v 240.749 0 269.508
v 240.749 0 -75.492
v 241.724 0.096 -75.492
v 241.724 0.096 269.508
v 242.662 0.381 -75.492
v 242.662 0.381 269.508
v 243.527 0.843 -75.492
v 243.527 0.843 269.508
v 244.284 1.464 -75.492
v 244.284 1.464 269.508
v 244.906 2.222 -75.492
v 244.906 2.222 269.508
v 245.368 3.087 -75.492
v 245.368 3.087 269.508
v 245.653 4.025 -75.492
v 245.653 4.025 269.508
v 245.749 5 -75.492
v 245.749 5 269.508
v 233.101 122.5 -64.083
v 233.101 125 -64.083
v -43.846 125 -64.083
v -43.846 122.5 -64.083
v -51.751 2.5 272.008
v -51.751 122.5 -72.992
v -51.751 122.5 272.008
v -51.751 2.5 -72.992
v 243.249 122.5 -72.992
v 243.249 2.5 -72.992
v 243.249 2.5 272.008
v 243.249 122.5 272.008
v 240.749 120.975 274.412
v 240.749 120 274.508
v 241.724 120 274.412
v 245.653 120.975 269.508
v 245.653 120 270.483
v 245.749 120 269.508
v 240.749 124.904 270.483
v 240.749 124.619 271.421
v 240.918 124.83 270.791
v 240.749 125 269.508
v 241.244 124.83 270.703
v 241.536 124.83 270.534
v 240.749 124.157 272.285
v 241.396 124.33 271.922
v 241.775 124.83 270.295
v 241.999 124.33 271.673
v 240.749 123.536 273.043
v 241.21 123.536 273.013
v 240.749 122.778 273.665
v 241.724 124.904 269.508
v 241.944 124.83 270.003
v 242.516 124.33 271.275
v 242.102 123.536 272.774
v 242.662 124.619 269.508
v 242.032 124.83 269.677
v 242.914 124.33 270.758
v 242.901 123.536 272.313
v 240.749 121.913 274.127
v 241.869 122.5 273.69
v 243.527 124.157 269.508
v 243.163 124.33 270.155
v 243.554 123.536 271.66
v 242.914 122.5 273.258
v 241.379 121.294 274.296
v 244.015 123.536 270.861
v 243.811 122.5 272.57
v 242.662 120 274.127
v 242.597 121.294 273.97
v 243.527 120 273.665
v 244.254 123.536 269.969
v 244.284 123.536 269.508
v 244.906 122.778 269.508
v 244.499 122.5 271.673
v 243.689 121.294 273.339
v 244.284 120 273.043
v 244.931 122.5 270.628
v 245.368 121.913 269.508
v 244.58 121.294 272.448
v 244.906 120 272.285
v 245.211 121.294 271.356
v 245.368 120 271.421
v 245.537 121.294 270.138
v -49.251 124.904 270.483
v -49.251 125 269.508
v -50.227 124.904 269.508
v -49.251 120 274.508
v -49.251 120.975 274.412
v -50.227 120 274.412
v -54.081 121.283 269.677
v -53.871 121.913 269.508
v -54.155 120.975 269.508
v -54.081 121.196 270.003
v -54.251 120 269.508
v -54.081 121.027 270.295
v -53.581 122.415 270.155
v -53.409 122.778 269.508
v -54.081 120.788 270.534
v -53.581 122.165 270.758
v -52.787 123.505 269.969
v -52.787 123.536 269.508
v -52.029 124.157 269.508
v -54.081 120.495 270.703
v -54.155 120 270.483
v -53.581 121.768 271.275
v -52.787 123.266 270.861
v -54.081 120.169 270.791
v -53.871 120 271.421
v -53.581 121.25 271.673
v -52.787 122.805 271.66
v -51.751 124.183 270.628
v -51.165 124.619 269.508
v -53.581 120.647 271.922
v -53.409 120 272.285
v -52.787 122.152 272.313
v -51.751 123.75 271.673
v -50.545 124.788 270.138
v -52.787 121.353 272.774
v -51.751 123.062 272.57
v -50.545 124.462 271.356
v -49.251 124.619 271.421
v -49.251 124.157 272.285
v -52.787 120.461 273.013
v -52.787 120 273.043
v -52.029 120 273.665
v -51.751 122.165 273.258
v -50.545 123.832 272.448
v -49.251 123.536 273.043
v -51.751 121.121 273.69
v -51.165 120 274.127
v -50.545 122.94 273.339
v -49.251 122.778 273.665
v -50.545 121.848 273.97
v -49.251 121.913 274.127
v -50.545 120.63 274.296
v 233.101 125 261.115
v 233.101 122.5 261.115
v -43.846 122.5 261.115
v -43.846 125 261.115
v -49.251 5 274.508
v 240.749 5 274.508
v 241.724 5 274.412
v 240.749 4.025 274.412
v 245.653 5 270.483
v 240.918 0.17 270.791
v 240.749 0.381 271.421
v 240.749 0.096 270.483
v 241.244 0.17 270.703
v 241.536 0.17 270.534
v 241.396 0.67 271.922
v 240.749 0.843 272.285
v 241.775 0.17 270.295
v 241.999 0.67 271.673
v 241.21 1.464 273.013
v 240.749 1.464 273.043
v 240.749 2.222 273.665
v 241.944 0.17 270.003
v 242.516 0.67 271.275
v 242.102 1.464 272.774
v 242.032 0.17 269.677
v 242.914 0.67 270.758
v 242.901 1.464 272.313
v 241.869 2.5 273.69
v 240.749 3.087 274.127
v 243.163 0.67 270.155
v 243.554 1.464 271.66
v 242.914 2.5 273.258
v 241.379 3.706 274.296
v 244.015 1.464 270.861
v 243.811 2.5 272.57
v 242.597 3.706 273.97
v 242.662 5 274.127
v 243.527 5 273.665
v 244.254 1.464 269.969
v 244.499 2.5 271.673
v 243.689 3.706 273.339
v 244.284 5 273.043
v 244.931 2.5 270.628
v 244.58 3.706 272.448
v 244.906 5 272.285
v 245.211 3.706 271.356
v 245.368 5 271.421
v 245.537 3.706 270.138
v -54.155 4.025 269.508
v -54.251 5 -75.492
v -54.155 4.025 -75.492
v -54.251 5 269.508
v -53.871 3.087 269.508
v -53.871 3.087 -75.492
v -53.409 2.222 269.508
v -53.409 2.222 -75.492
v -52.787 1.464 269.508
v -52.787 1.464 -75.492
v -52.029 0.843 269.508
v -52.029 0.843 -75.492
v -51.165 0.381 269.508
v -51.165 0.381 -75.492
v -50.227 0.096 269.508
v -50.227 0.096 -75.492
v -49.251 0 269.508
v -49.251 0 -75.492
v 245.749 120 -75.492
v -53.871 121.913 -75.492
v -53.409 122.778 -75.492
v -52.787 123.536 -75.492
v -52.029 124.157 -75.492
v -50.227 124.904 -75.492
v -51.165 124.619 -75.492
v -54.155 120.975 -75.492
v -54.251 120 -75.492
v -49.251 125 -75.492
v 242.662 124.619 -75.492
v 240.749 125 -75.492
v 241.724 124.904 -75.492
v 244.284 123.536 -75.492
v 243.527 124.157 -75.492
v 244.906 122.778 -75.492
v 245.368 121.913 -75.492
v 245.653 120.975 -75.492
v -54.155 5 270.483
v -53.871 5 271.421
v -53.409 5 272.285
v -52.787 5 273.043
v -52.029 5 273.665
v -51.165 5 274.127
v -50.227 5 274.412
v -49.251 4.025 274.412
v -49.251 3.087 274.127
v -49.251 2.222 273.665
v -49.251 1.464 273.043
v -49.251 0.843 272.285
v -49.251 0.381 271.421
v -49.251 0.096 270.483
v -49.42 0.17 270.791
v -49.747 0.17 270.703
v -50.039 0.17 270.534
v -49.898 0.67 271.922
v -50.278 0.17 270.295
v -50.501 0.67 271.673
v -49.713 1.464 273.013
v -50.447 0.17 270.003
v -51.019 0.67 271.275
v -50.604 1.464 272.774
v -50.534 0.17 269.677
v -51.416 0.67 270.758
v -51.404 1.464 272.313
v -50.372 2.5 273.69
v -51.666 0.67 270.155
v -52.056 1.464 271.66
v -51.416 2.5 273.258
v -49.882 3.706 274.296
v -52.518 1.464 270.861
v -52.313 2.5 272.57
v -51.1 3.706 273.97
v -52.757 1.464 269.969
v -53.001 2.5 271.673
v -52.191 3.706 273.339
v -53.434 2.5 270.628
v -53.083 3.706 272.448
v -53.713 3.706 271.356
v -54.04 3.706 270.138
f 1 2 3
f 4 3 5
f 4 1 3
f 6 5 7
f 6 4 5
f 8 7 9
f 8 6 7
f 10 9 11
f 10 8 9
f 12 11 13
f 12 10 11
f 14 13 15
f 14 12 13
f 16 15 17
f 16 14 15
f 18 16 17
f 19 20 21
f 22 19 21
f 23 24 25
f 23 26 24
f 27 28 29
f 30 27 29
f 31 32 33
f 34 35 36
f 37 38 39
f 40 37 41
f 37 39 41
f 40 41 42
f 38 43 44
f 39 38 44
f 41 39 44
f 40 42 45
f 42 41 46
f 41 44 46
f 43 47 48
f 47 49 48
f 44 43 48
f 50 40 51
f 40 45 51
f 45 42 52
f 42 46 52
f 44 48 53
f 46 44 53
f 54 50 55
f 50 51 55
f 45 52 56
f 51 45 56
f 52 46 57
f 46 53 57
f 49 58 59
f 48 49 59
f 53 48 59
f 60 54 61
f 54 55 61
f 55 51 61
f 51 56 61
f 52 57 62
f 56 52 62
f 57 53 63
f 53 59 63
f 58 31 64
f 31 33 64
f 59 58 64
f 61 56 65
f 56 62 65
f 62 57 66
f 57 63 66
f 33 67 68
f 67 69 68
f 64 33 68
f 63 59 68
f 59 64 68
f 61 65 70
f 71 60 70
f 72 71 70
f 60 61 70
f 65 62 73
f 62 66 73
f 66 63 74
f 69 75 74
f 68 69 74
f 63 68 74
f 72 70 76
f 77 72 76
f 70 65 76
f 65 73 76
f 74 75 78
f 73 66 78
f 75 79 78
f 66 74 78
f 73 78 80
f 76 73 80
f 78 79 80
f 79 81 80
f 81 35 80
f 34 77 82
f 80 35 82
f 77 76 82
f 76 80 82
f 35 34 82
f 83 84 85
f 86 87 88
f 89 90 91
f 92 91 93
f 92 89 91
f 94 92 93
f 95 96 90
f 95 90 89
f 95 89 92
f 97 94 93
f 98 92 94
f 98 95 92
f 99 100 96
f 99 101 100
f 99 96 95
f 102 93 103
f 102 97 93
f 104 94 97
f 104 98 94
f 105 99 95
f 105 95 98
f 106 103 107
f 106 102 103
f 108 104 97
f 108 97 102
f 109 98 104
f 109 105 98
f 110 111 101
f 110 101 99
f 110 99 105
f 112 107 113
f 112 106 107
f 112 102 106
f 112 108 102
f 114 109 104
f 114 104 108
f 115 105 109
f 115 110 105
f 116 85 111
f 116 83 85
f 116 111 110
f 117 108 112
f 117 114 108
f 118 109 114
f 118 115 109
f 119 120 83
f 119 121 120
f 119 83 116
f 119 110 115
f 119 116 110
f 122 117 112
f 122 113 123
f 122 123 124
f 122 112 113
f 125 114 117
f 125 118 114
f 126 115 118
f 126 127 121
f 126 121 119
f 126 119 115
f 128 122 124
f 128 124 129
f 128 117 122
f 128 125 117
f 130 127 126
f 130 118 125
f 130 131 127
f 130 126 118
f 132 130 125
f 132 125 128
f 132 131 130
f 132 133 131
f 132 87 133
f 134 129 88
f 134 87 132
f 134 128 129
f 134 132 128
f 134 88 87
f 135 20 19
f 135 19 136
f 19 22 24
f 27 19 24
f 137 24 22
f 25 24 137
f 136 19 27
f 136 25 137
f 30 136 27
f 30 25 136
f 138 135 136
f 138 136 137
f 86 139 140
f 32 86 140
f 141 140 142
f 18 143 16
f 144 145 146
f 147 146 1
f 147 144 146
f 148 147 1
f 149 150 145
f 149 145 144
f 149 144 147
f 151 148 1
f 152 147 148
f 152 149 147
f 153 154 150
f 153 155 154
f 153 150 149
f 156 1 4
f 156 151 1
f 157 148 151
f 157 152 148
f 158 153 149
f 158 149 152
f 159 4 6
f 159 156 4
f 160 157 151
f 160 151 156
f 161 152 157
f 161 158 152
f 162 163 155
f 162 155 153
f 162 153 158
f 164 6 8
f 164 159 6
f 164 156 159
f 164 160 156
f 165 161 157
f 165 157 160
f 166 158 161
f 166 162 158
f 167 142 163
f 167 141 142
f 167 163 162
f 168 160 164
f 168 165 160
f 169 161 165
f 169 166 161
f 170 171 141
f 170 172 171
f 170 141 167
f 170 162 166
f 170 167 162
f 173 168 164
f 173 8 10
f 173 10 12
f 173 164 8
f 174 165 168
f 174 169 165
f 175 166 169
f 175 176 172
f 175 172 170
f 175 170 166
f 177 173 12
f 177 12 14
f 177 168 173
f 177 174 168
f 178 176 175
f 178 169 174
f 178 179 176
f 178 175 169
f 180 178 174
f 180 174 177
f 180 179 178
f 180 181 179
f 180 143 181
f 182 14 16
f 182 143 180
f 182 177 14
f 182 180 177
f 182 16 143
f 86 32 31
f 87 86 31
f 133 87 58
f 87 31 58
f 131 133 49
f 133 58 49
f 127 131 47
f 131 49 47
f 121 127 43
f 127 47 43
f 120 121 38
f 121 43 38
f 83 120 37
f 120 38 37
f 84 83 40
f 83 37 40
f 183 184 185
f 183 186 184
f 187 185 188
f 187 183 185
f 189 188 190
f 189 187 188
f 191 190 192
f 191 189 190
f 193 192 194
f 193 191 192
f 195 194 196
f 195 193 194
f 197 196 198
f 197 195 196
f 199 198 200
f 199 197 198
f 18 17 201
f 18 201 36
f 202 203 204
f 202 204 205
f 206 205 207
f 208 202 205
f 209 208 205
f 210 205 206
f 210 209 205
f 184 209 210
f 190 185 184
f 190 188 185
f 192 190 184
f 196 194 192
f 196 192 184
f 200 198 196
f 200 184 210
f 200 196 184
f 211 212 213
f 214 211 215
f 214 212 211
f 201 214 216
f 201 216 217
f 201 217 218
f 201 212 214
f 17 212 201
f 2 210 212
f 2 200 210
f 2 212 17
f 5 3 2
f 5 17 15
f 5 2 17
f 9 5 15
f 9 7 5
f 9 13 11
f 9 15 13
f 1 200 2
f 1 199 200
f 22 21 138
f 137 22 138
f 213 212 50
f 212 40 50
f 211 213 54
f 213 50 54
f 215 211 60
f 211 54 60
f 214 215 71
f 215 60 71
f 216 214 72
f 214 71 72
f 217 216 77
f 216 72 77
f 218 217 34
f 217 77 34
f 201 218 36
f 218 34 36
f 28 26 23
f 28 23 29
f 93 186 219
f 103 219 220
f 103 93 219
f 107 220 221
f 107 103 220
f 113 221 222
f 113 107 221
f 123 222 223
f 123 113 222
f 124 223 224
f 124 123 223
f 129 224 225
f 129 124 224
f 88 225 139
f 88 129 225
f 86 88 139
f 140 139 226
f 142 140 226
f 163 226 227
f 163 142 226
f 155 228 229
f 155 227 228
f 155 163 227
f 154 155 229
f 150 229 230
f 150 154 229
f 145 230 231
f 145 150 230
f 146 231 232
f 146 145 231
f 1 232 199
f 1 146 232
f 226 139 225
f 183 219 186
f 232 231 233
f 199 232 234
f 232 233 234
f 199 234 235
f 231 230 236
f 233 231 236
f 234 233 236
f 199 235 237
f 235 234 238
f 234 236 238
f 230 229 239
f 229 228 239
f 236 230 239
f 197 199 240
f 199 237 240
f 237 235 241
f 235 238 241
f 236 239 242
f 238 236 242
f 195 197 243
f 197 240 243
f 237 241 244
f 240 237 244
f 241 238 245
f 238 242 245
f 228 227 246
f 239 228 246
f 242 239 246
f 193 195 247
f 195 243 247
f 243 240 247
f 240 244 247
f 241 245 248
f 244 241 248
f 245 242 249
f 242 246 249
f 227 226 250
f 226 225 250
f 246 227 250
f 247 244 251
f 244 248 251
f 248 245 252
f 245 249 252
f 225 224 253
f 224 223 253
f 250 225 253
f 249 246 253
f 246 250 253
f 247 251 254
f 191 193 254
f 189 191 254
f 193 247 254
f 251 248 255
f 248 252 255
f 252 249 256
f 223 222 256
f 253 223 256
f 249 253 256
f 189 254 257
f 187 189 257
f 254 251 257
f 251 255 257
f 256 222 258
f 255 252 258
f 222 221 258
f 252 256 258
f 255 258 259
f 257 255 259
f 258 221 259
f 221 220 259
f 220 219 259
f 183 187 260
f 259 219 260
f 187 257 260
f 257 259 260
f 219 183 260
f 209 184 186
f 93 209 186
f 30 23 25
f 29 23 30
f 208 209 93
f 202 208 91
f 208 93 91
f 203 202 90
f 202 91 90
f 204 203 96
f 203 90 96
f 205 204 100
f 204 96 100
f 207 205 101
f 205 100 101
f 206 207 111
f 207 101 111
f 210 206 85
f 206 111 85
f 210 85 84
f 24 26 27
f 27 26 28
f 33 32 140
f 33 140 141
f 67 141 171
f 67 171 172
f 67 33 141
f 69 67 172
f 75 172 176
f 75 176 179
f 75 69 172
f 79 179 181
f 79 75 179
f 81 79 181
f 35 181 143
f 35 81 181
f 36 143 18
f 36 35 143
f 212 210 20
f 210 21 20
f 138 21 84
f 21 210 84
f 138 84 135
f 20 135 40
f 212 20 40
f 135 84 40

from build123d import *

# Parameters (mm, degrees)
F0_W     = 300
F0_H     = 350
F1_DEPTH = 125
F2_T     = -2.5
F3_R     = 5
F4_W     = 276.946939528
F4_H     = 325.1978382468
F5_DEPTH = 120


with BuildPart() as f1:
    # F0 (on Front) → F1 (new body)
    with BuildSketch(Plane.XZ):
        with Locations((95.7486510277, 99.5076403022)):
            Rectangle(F0_W, F0_H)
    extrude(amount=-F1_DEPTH)

    # F2 (hollow: no face is removed)
    offset(amount=F2_T, mode=Mode.SUBTRACT)

    # F3
    f3_edges = [f1.edges().sort_by_distance(p)[0] for p in [
        (245.748651, 62.5, 274.50764),
        (95.748651, 125, 274.50764),
        (245.748651, 125, 99.50764),
        (-54.251349, 125, 99.50764),
        (-54.251349, 62.5, 274.50764),
        (95.748651, 0, 274.50764),
        (245.748651, 0, 99.50764),
        (-54.251349, 0, 99.50764),
    ]]
    fillet(f3_edges, radius=F3_R)

    # F4 (on face) → F5 (cut)
    with BuildSketch(Plane(origin=(0, 125, 0), x_dir=(-1, 0, 0), z_dir=(0, 1, 0))):
        with Locations((-94.6279279888, 98.5161848366)):
            Rectangle(F4_W, F4_H)
    extrude(amount=-F5_DEPTH, mode=Mode.SUBTRACT)


solid = f1.part
